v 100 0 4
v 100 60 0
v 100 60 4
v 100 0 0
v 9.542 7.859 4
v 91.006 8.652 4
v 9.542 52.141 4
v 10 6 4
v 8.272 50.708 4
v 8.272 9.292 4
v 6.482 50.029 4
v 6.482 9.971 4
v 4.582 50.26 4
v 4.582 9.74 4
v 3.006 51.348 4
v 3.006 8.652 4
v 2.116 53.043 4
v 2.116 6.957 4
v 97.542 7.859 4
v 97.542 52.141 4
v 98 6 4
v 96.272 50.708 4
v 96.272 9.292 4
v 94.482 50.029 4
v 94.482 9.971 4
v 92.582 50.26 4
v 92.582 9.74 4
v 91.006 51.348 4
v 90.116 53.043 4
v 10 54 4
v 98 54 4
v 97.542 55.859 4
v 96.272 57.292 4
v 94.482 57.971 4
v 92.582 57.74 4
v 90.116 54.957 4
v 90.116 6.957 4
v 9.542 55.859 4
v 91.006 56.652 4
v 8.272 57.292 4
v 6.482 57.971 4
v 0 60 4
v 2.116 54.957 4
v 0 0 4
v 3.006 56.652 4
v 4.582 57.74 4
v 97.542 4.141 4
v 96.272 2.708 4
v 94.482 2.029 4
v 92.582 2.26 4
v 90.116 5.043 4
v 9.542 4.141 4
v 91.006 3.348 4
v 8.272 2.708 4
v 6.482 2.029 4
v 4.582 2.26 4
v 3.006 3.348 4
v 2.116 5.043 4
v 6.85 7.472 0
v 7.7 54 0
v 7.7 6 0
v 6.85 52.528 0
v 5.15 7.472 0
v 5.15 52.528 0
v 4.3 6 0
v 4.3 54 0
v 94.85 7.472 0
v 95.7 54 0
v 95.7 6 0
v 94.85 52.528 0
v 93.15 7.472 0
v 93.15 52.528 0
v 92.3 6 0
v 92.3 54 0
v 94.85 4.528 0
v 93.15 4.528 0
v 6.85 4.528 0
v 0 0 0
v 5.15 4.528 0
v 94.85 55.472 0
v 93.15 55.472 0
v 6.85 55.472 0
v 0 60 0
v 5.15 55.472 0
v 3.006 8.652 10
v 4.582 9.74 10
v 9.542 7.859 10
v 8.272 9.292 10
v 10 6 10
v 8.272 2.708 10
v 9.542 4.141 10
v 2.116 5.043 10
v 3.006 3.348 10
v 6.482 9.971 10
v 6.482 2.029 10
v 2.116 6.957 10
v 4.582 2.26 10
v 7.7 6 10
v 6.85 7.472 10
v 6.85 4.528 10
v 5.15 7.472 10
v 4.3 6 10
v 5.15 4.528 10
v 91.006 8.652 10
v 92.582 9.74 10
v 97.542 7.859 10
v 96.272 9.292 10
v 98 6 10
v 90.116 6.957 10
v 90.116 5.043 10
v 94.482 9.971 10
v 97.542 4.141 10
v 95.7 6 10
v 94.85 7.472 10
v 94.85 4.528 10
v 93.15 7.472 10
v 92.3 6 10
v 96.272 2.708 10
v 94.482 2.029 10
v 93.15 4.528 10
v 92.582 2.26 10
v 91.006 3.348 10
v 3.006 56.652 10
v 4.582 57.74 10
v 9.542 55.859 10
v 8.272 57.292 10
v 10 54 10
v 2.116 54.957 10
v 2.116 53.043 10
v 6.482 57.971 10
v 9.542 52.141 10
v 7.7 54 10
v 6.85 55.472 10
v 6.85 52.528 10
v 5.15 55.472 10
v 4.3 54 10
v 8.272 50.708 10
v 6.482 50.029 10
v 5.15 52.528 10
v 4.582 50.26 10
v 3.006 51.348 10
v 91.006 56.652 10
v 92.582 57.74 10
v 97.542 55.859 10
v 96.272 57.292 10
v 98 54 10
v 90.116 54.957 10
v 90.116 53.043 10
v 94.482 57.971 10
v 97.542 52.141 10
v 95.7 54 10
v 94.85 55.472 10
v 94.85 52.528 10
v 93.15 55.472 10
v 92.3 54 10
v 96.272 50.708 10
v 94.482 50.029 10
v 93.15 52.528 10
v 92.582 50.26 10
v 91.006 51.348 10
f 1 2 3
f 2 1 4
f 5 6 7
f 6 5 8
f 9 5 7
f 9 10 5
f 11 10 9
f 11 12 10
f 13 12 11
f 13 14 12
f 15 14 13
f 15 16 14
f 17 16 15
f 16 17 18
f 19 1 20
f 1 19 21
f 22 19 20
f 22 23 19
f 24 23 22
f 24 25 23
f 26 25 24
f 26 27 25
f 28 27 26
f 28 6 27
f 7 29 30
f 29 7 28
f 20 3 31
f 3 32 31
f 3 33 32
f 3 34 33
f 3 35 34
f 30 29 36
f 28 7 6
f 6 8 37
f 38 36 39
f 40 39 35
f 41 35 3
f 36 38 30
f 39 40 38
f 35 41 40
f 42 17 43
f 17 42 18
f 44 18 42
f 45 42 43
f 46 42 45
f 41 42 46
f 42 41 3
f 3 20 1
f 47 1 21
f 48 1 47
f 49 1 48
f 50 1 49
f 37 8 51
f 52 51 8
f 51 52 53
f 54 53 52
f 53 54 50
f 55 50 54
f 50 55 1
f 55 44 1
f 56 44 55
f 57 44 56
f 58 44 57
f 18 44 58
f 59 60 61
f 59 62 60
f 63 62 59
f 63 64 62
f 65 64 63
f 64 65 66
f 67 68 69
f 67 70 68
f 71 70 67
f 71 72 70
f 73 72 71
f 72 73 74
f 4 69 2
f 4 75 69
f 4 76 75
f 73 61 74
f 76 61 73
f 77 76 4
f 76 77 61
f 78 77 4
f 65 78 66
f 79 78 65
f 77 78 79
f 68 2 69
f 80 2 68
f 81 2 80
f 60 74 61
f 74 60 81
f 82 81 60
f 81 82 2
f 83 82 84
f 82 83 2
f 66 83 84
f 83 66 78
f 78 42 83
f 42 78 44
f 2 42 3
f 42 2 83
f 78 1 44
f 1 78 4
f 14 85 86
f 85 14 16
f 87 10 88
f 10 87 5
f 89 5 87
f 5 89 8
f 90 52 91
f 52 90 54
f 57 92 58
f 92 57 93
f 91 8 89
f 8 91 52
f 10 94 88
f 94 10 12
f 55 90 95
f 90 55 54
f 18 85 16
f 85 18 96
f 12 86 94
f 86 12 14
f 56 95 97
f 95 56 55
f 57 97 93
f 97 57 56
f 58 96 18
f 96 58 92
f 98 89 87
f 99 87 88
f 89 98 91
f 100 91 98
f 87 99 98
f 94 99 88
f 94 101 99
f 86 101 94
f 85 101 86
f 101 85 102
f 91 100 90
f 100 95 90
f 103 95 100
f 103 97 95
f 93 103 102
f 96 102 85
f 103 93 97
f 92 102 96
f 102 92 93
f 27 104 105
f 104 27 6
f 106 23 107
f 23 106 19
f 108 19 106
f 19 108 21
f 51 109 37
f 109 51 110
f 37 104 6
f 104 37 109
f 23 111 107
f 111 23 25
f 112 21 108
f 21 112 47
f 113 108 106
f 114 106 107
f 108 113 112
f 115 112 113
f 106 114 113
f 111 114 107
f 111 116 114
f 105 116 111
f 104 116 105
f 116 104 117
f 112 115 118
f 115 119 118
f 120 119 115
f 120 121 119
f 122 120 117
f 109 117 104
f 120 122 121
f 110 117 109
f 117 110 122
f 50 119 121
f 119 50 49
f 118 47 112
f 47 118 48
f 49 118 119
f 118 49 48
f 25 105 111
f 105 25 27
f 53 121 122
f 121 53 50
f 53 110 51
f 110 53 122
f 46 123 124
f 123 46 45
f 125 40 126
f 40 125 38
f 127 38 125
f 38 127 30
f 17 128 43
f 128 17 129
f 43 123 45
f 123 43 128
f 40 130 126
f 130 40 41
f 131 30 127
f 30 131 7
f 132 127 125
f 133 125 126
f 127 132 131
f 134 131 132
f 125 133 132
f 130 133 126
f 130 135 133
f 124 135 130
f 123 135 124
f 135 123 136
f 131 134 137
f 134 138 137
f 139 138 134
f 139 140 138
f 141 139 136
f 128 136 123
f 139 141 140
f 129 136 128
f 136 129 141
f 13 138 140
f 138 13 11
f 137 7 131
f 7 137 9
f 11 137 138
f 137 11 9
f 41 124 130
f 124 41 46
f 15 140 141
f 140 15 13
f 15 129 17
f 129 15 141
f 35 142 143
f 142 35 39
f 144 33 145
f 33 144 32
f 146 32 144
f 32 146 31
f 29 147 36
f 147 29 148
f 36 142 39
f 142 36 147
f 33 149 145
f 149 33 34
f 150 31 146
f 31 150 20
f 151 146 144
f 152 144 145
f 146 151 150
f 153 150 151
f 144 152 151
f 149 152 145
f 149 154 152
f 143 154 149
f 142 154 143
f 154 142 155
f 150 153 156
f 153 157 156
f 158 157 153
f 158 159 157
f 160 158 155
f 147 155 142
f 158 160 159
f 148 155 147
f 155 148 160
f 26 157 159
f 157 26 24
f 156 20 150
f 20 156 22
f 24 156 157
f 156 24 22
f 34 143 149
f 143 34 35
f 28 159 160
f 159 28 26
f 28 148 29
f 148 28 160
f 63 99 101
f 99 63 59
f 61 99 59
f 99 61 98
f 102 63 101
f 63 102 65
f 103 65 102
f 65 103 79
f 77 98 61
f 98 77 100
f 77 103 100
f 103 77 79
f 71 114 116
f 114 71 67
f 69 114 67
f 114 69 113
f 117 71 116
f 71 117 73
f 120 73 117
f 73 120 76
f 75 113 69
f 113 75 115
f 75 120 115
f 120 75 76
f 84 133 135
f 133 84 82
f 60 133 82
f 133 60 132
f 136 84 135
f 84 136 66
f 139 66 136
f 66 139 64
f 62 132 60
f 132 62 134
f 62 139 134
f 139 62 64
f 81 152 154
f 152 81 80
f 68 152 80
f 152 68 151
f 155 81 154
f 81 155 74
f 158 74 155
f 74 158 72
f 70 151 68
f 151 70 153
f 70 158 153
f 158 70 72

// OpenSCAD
// Generated by OpenSCAD Framework v0.1.0
// Scene: Dispensing Cabinet Control Panel

// Structure: control_panel (PETG)
union() {
  // Substructure: mounting_system
difference() {
  union() {
  // Panel plate
cube([100.0, 60.0, 4.0], center=false);
  // Feature: corner_boss_0
translate([6.0, 6.0, 4.0]) {
  cylinder(h=6.0, r=4.0, center=false);
}
  // Feature: corner_boss_1
translate([94.0, 6.0, 4.0]) {
  cylinder(h=6.0, r=4.0, center=false);
}
  // Feature: corner_boss_2
translate([6.0, 54.0, 4.0]) {
  cylinder(h=6.0, r=4.0, center=false);
}
  // Feature: corner_boss_3
translate([94.0, 54.0, 4.0]) {
  cylinder(h=6.0, r=4.0, center=false);
}
}
  // Feature: corner_hole_0
translate([6.0, 6.0, -1.0]) {
  cylinder(h=12.0, r=1.7, center=false);
}
  // Feature: corner_hole_1
translate([94.0, 6.0, -1.0]) {
  cylinder(h=12.0, r=1.7, center=false);
}
  // Feature: corner_hole_2
translate([6.0, 54.0, -1.0]) {
  cylinder(h=12.0, r=1.7, center=false);
}
  // Feature: corner_hole_3
translate([94.0, 54.0, -1.0]) {
  cylinder(h=12.0, r=1.7, center=false);
}
}
  translate([20.0, 45.0, 0.0]) {
  // Substructure: ventilation_system
difference() {
  union() {
  // Vent boss
cube([30.0, 10.0, 4.0], center=false);
}
  // Feature: vent_slot_0
translate([3.0, 5.0, -1.0]) {
  cylinder(h=6.0, r=1.45, center=false);
}
  // Feature: vent_slot_1
translate([7.0, 5.0, -1.0]) {
  cylinder(h=6.0, r=1.45, center=false);
}
  // Feature: vent_slot_2
translate([11.0, 5.0, -1.0]) {
  cylinder(h=6.0, r=1.45, center=false);
}
  // Feature: vent_slot_3
translate([15.0, 5.0, -1.0]) {
  cylinder(h=6.0, r=1.45, center=false);
}
  // Feature: vent_slot_4
translate([19.0, 5.0, -1.0]) {
  cylinder(h=6.0, r=1.45, center=false);
}
  // Feature: vent_slot_5
translate([23.0, 5.0, -1.0]) {
  cylinder(h=6.0, r=1.45, center=false);
}
}
}
  translate([70.0, 10.0, 0.0]) {
  // Substructure: cable_routing_system
difference() {
  union() {
  // Grommet boss
cube([20.0, 20.0, 4.0], center=false);
}
  // Feature: cable_grommet_hole
translate([10.0, 10.0, -1.0]) {
  cylinder(h=6.0, r=6.2, center=false);
}
}
}
}
